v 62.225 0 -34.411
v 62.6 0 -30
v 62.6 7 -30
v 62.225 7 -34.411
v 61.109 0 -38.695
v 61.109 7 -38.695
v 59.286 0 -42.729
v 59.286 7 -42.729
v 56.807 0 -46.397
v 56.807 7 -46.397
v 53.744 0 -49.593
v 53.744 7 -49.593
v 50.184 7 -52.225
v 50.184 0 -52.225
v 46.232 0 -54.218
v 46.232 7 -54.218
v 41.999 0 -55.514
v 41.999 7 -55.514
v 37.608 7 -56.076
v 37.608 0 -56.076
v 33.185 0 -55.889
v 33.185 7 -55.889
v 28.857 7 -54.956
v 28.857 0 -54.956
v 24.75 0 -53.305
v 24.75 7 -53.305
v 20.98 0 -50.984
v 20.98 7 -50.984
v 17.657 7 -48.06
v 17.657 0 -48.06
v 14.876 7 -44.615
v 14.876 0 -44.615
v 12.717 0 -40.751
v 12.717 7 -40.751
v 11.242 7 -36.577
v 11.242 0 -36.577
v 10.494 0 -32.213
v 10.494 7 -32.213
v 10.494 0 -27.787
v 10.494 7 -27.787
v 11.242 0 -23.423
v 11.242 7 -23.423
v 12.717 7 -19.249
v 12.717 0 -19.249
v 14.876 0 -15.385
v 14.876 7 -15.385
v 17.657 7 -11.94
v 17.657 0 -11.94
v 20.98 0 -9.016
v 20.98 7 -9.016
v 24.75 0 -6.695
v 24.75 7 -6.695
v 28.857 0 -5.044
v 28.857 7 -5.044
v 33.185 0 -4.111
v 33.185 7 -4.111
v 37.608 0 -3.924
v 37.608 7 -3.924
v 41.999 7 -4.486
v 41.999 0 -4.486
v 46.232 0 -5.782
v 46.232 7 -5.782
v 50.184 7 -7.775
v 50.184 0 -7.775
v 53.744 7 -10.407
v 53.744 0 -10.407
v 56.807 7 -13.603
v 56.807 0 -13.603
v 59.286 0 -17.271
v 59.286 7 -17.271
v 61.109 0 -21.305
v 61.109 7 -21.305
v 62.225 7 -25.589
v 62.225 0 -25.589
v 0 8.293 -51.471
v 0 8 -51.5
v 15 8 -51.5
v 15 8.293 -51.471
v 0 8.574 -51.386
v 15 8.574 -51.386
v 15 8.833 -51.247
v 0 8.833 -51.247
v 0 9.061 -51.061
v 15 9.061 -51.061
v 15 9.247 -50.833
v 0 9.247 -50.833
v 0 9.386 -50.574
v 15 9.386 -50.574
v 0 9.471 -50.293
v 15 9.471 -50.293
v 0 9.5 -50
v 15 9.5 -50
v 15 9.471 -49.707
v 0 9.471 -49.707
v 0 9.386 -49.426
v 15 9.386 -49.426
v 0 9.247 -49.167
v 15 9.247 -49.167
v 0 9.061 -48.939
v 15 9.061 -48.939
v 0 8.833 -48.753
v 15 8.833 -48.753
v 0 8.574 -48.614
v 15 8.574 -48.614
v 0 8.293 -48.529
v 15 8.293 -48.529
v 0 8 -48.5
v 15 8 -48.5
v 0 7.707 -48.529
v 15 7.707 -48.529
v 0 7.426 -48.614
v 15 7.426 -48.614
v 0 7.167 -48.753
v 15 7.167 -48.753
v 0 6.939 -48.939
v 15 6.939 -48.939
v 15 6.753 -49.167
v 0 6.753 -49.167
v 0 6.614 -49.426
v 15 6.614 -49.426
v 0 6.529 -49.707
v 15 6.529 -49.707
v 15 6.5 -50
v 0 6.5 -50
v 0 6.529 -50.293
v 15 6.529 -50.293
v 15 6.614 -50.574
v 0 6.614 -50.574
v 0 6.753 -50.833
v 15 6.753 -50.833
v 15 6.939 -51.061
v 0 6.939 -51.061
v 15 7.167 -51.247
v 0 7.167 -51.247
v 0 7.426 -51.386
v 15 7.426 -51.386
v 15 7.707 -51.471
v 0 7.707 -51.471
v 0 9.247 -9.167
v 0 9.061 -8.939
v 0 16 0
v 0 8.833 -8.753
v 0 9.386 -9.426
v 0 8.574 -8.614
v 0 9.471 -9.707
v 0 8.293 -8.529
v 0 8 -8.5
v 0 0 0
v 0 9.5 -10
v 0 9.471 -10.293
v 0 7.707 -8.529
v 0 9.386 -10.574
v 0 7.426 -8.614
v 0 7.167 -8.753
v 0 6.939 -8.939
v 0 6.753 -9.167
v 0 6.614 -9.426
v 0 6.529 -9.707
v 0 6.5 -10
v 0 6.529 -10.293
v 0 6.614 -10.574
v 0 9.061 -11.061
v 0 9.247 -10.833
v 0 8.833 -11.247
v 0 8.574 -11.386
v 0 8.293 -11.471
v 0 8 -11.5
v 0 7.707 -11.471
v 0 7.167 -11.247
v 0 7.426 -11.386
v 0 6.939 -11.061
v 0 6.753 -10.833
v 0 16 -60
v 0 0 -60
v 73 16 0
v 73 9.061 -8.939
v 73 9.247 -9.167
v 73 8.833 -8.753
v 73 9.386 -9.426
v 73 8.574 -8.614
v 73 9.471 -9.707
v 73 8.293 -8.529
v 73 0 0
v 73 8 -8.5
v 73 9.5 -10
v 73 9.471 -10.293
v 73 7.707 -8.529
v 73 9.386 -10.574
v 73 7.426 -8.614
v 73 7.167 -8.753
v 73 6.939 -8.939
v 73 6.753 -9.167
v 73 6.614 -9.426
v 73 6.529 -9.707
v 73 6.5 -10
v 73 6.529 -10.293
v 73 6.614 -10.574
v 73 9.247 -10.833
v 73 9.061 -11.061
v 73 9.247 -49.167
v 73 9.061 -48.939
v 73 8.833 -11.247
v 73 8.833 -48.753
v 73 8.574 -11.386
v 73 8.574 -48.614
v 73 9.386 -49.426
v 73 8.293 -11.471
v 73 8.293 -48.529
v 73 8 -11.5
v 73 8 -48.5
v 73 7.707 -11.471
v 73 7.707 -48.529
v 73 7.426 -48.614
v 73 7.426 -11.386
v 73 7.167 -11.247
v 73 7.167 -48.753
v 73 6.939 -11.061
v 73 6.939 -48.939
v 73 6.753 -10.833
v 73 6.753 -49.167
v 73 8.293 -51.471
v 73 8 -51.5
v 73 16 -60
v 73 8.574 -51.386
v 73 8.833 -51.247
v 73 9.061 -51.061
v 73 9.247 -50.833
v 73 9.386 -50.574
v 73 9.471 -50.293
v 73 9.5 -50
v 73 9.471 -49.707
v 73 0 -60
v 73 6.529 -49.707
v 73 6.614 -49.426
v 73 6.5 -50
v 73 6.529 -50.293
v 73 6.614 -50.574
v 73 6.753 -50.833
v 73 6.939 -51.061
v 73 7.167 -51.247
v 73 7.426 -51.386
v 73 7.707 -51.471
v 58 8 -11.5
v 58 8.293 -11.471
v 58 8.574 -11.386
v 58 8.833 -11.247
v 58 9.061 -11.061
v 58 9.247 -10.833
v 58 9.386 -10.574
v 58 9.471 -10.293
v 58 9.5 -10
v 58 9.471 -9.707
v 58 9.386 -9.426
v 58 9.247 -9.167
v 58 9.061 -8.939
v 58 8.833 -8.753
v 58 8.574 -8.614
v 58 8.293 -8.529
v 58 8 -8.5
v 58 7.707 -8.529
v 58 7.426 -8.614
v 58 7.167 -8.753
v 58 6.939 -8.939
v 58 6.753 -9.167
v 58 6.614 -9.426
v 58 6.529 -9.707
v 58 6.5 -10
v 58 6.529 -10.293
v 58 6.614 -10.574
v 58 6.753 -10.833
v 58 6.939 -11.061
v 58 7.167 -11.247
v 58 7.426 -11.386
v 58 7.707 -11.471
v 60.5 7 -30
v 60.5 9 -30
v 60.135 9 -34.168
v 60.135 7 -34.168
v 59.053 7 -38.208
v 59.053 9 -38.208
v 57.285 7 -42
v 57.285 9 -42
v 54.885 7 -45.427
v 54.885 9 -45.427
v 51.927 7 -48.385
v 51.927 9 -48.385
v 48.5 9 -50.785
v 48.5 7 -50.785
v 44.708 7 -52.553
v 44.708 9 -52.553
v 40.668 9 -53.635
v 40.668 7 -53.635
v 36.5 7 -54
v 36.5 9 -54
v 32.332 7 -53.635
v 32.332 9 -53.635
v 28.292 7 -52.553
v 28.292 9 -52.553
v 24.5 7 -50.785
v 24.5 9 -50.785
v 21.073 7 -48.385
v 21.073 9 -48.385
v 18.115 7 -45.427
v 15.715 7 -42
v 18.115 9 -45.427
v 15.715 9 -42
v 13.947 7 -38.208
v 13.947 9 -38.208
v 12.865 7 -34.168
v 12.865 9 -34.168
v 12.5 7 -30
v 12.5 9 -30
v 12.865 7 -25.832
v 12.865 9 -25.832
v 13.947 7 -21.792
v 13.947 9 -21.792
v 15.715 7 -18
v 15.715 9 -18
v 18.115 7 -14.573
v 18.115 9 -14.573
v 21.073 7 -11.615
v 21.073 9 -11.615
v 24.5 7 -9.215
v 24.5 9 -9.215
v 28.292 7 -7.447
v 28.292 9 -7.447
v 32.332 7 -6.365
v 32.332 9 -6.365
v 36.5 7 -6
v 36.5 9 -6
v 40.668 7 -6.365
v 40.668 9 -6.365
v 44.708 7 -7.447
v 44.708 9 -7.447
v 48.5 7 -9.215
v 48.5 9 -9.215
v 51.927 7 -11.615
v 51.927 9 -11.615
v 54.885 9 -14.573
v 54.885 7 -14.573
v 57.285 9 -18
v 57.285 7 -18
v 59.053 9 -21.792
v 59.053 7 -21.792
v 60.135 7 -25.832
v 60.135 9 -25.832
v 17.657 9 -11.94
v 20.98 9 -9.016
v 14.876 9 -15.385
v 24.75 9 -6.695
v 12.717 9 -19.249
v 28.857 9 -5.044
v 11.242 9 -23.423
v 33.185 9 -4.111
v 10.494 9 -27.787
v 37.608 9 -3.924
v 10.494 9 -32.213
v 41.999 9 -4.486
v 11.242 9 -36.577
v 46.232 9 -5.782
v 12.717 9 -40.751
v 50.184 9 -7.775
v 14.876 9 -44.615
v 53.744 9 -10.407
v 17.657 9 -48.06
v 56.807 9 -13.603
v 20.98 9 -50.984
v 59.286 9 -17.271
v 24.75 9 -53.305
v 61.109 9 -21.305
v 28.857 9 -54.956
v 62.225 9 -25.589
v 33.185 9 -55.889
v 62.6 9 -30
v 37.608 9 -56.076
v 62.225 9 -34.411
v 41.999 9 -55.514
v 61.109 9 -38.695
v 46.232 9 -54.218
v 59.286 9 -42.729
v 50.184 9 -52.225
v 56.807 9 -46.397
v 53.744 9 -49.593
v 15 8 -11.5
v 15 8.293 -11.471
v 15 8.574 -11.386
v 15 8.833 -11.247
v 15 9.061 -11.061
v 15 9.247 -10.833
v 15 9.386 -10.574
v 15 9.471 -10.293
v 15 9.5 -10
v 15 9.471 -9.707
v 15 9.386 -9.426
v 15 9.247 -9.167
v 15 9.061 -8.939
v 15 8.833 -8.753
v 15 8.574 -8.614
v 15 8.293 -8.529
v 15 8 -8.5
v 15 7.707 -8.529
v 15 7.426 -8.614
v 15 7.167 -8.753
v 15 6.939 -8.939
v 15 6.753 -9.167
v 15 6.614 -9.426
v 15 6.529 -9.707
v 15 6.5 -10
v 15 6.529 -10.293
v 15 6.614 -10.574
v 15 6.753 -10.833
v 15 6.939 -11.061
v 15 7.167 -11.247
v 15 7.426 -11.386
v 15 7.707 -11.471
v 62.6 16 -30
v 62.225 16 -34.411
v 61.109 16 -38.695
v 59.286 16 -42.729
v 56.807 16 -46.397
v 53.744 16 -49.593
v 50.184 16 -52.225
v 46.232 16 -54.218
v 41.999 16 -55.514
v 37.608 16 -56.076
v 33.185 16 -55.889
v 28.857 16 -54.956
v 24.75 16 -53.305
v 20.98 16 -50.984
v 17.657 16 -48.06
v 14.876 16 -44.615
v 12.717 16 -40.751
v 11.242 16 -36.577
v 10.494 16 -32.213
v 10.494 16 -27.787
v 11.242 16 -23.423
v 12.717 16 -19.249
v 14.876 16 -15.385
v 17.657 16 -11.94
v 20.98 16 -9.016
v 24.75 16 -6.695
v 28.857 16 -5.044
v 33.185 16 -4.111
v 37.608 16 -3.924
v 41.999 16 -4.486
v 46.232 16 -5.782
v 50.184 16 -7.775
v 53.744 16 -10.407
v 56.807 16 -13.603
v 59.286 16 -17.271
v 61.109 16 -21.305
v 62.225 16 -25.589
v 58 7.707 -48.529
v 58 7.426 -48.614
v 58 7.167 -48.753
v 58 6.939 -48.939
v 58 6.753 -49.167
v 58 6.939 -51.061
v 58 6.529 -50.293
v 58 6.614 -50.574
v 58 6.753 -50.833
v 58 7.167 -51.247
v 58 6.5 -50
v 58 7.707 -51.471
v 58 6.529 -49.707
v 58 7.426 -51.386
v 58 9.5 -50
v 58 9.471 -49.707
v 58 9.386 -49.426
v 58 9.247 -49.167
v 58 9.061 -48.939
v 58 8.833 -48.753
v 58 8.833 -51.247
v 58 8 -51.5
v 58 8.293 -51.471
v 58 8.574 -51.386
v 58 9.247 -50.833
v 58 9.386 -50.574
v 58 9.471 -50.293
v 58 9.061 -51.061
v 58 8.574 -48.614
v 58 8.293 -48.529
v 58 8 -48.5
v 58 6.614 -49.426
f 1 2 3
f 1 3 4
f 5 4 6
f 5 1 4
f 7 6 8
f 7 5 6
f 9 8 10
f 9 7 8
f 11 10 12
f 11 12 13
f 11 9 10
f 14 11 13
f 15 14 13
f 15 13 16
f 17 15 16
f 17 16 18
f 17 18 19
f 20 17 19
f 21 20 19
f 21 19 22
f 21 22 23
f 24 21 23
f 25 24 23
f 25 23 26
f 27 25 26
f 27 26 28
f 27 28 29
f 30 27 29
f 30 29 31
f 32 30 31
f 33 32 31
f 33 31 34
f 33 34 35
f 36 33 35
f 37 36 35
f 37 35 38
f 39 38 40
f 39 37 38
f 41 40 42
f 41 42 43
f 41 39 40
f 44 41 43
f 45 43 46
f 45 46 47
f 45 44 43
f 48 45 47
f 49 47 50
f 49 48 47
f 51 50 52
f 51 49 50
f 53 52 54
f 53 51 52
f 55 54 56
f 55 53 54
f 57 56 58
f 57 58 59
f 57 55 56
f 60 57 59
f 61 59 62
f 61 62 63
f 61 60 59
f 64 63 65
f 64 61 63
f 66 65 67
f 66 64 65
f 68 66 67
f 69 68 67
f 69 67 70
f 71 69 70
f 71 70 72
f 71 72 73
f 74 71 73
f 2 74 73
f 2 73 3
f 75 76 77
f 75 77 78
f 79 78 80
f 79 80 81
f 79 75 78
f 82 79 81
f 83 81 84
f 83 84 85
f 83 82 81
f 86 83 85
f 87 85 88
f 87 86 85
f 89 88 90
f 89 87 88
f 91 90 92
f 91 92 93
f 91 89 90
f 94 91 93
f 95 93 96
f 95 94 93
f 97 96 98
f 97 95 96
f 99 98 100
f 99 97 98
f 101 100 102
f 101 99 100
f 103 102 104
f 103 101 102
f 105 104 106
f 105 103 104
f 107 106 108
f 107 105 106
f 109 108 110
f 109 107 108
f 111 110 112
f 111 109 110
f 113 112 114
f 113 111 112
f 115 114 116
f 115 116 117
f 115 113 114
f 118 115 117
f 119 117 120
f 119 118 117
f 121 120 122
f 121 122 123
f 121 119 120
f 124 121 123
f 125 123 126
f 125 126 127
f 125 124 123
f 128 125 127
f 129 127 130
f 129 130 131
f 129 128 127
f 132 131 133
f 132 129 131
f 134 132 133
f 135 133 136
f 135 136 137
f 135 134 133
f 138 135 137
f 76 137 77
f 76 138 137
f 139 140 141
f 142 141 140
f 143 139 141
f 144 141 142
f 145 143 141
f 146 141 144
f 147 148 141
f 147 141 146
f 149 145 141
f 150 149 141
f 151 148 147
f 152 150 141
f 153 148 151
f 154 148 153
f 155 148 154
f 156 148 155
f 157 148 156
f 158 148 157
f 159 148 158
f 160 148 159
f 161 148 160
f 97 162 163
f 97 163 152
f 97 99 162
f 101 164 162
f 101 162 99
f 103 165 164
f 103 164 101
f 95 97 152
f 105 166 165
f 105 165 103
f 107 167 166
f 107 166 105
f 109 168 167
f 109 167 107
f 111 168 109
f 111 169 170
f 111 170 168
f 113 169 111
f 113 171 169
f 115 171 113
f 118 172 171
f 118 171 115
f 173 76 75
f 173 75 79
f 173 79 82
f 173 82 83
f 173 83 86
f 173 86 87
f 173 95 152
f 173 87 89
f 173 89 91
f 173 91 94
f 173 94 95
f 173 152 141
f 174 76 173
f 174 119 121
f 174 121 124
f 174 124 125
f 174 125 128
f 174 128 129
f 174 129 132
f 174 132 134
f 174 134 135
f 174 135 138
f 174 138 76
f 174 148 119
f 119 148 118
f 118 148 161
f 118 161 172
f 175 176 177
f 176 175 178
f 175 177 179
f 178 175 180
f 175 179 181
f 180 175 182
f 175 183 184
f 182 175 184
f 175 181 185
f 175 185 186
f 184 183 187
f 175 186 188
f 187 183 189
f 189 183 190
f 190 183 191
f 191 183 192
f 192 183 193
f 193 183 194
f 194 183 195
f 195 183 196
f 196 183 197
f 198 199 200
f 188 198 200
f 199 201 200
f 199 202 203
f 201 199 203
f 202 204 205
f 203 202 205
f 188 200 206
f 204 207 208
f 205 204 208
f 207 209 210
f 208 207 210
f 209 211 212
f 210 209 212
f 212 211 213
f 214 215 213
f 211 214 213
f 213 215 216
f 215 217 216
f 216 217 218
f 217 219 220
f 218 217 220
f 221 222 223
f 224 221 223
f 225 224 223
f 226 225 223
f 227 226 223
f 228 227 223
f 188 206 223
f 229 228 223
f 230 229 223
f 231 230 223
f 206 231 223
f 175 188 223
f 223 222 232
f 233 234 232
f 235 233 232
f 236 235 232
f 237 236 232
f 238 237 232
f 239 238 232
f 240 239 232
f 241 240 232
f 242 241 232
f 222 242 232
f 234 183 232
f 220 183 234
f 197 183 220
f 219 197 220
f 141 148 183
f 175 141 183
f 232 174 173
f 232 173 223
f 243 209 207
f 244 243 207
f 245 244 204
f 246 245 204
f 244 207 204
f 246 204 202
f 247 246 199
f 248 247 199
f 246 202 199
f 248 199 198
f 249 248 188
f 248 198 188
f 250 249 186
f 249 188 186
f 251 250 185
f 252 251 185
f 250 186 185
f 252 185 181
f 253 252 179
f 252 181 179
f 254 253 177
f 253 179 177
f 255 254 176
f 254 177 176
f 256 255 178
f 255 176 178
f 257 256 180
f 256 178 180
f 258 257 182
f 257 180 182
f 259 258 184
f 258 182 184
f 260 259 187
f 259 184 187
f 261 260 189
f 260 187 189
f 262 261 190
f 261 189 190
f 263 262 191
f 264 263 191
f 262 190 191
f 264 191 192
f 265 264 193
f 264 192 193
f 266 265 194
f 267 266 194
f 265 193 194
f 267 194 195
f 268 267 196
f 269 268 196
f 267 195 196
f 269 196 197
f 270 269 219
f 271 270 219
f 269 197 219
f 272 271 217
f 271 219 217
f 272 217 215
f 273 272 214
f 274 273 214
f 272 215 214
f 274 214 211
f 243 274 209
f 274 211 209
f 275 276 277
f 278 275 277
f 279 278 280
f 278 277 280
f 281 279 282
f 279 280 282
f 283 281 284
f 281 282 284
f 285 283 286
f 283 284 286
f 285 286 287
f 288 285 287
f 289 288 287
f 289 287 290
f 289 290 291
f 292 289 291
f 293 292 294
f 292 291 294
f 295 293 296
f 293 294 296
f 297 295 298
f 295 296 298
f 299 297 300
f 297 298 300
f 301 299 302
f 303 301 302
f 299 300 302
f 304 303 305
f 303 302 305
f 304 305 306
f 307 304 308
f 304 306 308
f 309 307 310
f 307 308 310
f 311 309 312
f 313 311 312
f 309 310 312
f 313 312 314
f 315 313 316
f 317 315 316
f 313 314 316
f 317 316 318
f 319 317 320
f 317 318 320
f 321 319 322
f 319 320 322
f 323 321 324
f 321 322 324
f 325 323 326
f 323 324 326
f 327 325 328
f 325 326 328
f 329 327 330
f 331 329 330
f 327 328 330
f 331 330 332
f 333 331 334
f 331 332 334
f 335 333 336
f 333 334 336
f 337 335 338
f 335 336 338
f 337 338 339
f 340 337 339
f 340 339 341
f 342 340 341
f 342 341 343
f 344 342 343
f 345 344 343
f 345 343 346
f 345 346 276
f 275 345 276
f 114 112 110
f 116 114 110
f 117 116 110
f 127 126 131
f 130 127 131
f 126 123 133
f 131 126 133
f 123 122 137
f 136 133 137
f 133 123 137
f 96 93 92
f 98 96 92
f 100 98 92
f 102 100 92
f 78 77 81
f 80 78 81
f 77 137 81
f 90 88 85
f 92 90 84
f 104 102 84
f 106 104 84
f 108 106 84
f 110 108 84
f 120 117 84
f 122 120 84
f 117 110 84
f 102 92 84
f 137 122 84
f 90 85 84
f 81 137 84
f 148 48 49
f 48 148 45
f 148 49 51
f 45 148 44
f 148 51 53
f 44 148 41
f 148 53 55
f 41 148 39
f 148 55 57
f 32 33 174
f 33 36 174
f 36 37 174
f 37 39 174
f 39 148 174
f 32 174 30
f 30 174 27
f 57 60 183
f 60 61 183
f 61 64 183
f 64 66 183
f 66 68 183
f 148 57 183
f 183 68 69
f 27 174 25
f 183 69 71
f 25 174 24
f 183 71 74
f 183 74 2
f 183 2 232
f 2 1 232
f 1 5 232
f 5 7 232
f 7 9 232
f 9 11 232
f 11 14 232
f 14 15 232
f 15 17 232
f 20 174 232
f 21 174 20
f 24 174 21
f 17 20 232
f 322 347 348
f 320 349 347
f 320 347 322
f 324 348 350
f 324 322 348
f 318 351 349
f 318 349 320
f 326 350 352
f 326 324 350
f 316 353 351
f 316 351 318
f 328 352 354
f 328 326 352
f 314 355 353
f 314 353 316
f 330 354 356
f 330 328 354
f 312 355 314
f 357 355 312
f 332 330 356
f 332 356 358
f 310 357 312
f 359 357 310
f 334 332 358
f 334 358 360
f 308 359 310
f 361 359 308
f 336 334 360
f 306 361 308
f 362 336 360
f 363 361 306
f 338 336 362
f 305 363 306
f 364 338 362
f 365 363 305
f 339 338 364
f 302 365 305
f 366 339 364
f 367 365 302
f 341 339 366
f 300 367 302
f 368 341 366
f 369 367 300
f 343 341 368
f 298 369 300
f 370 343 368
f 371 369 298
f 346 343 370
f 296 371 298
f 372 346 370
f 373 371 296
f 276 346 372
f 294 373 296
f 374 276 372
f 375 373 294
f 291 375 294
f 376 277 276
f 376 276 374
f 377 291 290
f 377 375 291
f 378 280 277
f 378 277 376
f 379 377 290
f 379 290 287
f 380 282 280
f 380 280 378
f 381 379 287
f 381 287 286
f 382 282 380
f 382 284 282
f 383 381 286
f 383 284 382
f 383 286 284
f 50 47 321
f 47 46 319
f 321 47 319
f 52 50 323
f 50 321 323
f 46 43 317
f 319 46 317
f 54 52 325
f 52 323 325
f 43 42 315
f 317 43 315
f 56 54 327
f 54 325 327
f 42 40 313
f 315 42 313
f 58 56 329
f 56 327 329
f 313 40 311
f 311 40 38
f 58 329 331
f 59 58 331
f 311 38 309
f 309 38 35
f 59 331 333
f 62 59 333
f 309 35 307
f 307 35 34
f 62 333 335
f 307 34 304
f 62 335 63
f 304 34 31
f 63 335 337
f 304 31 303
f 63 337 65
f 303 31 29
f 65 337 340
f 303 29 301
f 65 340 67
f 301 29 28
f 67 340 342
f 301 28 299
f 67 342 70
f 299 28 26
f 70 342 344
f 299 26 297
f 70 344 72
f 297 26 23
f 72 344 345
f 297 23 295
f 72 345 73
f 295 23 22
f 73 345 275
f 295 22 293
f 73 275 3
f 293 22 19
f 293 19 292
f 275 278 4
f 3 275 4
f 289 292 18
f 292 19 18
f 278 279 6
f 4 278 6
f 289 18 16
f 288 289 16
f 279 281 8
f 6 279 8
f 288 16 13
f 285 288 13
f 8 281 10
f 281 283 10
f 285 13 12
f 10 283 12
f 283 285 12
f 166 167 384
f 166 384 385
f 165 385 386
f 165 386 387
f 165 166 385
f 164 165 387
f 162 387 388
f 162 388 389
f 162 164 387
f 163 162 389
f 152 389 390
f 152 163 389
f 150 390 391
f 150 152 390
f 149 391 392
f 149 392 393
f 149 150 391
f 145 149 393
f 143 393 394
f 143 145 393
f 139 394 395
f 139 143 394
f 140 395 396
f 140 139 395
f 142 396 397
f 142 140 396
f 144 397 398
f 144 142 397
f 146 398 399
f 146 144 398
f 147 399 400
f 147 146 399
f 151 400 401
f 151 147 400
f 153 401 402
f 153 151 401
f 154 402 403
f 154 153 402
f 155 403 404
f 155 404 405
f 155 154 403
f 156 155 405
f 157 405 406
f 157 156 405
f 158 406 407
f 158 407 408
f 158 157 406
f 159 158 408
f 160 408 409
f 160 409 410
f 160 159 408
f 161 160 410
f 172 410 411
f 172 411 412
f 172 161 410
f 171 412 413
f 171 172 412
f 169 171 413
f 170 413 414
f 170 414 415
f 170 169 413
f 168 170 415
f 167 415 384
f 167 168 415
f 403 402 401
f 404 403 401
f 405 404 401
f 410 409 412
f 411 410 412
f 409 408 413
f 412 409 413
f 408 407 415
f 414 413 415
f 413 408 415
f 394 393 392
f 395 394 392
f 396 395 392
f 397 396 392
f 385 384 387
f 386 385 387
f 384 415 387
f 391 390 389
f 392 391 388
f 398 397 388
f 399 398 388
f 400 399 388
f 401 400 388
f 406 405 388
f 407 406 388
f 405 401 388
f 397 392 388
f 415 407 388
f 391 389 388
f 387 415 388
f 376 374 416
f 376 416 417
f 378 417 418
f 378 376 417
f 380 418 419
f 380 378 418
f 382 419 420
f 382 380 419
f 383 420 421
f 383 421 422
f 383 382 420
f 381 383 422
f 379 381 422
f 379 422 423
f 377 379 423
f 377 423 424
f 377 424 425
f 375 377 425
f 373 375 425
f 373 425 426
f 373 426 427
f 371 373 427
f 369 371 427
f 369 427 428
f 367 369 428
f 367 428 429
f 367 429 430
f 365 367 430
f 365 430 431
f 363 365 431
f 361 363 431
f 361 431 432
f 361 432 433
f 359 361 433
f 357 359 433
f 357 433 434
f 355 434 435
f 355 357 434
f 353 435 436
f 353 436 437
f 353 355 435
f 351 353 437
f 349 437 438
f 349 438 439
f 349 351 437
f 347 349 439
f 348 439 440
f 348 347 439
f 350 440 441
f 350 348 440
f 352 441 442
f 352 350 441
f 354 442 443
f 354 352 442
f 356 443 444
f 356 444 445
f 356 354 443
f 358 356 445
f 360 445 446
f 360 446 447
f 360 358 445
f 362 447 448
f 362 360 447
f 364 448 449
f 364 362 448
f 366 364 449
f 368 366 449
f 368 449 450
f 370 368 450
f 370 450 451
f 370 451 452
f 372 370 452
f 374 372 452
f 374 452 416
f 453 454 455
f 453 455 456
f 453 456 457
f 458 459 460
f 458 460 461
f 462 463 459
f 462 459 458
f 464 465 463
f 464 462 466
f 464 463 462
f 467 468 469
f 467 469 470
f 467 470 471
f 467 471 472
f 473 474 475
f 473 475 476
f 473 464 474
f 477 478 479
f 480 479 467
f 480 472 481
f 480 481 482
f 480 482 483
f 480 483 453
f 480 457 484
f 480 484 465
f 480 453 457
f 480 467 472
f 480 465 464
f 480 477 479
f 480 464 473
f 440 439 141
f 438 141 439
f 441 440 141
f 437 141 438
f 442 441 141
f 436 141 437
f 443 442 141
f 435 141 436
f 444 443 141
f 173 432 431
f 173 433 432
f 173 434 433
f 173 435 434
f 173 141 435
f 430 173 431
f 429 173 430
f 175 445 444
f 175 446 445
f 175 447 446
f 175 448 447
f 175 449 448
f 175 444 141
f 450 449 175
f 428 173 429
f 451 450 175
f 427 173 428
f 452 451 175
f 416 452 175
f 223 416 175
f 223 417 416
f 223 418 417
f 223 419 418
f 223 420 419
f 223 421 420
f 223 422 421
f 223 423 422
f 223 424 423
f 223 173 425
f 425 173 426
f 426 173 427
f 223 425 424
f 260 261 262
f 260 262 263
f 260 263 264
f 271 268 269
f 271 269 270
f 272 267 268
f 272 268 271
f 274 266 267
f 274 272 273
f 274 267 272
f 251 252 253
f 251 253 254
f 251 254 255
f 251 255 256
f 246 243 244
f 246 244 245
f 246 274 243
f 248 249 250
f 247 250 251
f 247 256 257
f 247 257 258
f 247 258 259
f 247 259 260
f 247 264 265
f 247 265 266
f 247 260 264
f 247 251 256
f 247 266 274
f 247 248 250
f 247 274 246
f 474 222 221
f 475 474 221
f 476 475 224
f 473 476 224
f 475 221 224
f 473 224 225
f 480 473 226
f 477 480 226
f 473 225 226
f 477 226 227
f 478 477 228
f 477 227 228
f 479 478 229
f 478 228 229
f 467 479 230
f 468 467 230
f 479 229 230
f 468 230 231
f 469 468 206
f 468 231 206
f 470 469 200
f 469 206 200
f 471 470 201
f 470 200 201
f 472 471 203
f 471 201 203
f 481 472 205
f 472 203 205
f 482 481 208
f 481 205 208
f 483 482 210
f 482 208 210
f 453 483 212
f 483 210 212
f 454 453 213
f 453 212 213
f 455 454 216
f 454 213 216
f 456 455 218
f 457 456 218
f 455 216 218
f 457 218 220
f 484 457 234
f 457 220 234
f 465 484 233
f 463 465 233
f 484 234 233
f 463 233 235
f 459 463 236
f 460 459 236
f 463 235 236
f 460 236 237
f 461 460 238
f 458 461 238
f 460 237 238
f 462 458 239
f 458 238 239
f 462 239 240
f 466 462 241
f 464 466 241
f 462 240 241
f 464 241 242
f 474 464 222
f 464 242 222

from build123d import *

# Parameters (mm, degrees)
SKETCH1_W           = 73
SKETCH1_H           = 60
SKETCH1_R           = 26.1
BOSS_EXTRUDE1_DEPTH = 16
BOSS_EXTRUDE2_START = -7
SKETCH3_R           = 26.1
SKETCH3_R_2         = 24
BOSS_EXTRUDE2_DEPTH = 2
SKETCH2_R           = 1.5
CUT_EXTRUDE1_DEPTH  = 15
CUT_EXTRUDE2_START  = -73
SKETCH2_2_R         = 1.5
CUT_EXTRUDE2_DEPTH  = 15


with BuildPart() as part:
    # Sketch1 → Boss-Extrude1 (new body)
    with BuildSketch(Plane(origin=(0, 0, 0), x_dir=(1, 0, 0), z_dir=(0, 1, 0))):
        with Locations((36.5, 30)):
            Rectangle(SKETCH1_W, SKETCH1_H)
        with Locations((36.5, 30)):
            Circle(SKETCH1_R, mode=Mode.SUBTRACT)
    extrude(amount=BOSS_EXTRUDE1_DEPTH)

    # Sketch3 → Boss-Extrude2 (add)
    with BuildSketch(Plane(origin=(0, 16, 0), x_dir=(1, 0, 0), z_dir=(0, 1, 0)).offset(BOSS_EXTRUDE2_START)):
        with Locations((36.5, 30)):
            Circle(SKETCH3_R)
        with Locations((36.5, 30)):
            Circle(SKETCH3_R_2, mode=Mode.SUBTRACT)
    extrude(amount=-BOSS_EXTRUDE2_DEPTH)

    # Sketch2 → Cut-Extrude1 (cut)
    with BuildSketch(Plane(origin=(73, 0, 0), x_dir=(0, 0, -1), z_dir=(1, 0, 0))):
        with Locations((10, 8)):
            Circle(SKETCH2_R)
        with Locations((50, 8)):
            Circle(SKETCH2_R)
    extrude(amount=-CUT_EXTRUDE1_DEPTH, mode=Mode.SUBTRACT)

    # Sketch2<2> → Cut-Extrude2 (cut)
    with BuildSketch(Plane(origin=(73, 0, 0), x_dir=(0, 0, -1), z_dir=(1, 0, 0)).offset(CUT_EXTRUDE2_START)):
        with Locations((10, 8)):
            Circle(SKETCH2_2_R)
        with Locations((50, 8)):
            Circle(SKETCH2_2_R)
    extrude(amount=CUT_EXTRUDE2_DEPTH, mode=Mode.SUBTRACT)


solid = part.part
